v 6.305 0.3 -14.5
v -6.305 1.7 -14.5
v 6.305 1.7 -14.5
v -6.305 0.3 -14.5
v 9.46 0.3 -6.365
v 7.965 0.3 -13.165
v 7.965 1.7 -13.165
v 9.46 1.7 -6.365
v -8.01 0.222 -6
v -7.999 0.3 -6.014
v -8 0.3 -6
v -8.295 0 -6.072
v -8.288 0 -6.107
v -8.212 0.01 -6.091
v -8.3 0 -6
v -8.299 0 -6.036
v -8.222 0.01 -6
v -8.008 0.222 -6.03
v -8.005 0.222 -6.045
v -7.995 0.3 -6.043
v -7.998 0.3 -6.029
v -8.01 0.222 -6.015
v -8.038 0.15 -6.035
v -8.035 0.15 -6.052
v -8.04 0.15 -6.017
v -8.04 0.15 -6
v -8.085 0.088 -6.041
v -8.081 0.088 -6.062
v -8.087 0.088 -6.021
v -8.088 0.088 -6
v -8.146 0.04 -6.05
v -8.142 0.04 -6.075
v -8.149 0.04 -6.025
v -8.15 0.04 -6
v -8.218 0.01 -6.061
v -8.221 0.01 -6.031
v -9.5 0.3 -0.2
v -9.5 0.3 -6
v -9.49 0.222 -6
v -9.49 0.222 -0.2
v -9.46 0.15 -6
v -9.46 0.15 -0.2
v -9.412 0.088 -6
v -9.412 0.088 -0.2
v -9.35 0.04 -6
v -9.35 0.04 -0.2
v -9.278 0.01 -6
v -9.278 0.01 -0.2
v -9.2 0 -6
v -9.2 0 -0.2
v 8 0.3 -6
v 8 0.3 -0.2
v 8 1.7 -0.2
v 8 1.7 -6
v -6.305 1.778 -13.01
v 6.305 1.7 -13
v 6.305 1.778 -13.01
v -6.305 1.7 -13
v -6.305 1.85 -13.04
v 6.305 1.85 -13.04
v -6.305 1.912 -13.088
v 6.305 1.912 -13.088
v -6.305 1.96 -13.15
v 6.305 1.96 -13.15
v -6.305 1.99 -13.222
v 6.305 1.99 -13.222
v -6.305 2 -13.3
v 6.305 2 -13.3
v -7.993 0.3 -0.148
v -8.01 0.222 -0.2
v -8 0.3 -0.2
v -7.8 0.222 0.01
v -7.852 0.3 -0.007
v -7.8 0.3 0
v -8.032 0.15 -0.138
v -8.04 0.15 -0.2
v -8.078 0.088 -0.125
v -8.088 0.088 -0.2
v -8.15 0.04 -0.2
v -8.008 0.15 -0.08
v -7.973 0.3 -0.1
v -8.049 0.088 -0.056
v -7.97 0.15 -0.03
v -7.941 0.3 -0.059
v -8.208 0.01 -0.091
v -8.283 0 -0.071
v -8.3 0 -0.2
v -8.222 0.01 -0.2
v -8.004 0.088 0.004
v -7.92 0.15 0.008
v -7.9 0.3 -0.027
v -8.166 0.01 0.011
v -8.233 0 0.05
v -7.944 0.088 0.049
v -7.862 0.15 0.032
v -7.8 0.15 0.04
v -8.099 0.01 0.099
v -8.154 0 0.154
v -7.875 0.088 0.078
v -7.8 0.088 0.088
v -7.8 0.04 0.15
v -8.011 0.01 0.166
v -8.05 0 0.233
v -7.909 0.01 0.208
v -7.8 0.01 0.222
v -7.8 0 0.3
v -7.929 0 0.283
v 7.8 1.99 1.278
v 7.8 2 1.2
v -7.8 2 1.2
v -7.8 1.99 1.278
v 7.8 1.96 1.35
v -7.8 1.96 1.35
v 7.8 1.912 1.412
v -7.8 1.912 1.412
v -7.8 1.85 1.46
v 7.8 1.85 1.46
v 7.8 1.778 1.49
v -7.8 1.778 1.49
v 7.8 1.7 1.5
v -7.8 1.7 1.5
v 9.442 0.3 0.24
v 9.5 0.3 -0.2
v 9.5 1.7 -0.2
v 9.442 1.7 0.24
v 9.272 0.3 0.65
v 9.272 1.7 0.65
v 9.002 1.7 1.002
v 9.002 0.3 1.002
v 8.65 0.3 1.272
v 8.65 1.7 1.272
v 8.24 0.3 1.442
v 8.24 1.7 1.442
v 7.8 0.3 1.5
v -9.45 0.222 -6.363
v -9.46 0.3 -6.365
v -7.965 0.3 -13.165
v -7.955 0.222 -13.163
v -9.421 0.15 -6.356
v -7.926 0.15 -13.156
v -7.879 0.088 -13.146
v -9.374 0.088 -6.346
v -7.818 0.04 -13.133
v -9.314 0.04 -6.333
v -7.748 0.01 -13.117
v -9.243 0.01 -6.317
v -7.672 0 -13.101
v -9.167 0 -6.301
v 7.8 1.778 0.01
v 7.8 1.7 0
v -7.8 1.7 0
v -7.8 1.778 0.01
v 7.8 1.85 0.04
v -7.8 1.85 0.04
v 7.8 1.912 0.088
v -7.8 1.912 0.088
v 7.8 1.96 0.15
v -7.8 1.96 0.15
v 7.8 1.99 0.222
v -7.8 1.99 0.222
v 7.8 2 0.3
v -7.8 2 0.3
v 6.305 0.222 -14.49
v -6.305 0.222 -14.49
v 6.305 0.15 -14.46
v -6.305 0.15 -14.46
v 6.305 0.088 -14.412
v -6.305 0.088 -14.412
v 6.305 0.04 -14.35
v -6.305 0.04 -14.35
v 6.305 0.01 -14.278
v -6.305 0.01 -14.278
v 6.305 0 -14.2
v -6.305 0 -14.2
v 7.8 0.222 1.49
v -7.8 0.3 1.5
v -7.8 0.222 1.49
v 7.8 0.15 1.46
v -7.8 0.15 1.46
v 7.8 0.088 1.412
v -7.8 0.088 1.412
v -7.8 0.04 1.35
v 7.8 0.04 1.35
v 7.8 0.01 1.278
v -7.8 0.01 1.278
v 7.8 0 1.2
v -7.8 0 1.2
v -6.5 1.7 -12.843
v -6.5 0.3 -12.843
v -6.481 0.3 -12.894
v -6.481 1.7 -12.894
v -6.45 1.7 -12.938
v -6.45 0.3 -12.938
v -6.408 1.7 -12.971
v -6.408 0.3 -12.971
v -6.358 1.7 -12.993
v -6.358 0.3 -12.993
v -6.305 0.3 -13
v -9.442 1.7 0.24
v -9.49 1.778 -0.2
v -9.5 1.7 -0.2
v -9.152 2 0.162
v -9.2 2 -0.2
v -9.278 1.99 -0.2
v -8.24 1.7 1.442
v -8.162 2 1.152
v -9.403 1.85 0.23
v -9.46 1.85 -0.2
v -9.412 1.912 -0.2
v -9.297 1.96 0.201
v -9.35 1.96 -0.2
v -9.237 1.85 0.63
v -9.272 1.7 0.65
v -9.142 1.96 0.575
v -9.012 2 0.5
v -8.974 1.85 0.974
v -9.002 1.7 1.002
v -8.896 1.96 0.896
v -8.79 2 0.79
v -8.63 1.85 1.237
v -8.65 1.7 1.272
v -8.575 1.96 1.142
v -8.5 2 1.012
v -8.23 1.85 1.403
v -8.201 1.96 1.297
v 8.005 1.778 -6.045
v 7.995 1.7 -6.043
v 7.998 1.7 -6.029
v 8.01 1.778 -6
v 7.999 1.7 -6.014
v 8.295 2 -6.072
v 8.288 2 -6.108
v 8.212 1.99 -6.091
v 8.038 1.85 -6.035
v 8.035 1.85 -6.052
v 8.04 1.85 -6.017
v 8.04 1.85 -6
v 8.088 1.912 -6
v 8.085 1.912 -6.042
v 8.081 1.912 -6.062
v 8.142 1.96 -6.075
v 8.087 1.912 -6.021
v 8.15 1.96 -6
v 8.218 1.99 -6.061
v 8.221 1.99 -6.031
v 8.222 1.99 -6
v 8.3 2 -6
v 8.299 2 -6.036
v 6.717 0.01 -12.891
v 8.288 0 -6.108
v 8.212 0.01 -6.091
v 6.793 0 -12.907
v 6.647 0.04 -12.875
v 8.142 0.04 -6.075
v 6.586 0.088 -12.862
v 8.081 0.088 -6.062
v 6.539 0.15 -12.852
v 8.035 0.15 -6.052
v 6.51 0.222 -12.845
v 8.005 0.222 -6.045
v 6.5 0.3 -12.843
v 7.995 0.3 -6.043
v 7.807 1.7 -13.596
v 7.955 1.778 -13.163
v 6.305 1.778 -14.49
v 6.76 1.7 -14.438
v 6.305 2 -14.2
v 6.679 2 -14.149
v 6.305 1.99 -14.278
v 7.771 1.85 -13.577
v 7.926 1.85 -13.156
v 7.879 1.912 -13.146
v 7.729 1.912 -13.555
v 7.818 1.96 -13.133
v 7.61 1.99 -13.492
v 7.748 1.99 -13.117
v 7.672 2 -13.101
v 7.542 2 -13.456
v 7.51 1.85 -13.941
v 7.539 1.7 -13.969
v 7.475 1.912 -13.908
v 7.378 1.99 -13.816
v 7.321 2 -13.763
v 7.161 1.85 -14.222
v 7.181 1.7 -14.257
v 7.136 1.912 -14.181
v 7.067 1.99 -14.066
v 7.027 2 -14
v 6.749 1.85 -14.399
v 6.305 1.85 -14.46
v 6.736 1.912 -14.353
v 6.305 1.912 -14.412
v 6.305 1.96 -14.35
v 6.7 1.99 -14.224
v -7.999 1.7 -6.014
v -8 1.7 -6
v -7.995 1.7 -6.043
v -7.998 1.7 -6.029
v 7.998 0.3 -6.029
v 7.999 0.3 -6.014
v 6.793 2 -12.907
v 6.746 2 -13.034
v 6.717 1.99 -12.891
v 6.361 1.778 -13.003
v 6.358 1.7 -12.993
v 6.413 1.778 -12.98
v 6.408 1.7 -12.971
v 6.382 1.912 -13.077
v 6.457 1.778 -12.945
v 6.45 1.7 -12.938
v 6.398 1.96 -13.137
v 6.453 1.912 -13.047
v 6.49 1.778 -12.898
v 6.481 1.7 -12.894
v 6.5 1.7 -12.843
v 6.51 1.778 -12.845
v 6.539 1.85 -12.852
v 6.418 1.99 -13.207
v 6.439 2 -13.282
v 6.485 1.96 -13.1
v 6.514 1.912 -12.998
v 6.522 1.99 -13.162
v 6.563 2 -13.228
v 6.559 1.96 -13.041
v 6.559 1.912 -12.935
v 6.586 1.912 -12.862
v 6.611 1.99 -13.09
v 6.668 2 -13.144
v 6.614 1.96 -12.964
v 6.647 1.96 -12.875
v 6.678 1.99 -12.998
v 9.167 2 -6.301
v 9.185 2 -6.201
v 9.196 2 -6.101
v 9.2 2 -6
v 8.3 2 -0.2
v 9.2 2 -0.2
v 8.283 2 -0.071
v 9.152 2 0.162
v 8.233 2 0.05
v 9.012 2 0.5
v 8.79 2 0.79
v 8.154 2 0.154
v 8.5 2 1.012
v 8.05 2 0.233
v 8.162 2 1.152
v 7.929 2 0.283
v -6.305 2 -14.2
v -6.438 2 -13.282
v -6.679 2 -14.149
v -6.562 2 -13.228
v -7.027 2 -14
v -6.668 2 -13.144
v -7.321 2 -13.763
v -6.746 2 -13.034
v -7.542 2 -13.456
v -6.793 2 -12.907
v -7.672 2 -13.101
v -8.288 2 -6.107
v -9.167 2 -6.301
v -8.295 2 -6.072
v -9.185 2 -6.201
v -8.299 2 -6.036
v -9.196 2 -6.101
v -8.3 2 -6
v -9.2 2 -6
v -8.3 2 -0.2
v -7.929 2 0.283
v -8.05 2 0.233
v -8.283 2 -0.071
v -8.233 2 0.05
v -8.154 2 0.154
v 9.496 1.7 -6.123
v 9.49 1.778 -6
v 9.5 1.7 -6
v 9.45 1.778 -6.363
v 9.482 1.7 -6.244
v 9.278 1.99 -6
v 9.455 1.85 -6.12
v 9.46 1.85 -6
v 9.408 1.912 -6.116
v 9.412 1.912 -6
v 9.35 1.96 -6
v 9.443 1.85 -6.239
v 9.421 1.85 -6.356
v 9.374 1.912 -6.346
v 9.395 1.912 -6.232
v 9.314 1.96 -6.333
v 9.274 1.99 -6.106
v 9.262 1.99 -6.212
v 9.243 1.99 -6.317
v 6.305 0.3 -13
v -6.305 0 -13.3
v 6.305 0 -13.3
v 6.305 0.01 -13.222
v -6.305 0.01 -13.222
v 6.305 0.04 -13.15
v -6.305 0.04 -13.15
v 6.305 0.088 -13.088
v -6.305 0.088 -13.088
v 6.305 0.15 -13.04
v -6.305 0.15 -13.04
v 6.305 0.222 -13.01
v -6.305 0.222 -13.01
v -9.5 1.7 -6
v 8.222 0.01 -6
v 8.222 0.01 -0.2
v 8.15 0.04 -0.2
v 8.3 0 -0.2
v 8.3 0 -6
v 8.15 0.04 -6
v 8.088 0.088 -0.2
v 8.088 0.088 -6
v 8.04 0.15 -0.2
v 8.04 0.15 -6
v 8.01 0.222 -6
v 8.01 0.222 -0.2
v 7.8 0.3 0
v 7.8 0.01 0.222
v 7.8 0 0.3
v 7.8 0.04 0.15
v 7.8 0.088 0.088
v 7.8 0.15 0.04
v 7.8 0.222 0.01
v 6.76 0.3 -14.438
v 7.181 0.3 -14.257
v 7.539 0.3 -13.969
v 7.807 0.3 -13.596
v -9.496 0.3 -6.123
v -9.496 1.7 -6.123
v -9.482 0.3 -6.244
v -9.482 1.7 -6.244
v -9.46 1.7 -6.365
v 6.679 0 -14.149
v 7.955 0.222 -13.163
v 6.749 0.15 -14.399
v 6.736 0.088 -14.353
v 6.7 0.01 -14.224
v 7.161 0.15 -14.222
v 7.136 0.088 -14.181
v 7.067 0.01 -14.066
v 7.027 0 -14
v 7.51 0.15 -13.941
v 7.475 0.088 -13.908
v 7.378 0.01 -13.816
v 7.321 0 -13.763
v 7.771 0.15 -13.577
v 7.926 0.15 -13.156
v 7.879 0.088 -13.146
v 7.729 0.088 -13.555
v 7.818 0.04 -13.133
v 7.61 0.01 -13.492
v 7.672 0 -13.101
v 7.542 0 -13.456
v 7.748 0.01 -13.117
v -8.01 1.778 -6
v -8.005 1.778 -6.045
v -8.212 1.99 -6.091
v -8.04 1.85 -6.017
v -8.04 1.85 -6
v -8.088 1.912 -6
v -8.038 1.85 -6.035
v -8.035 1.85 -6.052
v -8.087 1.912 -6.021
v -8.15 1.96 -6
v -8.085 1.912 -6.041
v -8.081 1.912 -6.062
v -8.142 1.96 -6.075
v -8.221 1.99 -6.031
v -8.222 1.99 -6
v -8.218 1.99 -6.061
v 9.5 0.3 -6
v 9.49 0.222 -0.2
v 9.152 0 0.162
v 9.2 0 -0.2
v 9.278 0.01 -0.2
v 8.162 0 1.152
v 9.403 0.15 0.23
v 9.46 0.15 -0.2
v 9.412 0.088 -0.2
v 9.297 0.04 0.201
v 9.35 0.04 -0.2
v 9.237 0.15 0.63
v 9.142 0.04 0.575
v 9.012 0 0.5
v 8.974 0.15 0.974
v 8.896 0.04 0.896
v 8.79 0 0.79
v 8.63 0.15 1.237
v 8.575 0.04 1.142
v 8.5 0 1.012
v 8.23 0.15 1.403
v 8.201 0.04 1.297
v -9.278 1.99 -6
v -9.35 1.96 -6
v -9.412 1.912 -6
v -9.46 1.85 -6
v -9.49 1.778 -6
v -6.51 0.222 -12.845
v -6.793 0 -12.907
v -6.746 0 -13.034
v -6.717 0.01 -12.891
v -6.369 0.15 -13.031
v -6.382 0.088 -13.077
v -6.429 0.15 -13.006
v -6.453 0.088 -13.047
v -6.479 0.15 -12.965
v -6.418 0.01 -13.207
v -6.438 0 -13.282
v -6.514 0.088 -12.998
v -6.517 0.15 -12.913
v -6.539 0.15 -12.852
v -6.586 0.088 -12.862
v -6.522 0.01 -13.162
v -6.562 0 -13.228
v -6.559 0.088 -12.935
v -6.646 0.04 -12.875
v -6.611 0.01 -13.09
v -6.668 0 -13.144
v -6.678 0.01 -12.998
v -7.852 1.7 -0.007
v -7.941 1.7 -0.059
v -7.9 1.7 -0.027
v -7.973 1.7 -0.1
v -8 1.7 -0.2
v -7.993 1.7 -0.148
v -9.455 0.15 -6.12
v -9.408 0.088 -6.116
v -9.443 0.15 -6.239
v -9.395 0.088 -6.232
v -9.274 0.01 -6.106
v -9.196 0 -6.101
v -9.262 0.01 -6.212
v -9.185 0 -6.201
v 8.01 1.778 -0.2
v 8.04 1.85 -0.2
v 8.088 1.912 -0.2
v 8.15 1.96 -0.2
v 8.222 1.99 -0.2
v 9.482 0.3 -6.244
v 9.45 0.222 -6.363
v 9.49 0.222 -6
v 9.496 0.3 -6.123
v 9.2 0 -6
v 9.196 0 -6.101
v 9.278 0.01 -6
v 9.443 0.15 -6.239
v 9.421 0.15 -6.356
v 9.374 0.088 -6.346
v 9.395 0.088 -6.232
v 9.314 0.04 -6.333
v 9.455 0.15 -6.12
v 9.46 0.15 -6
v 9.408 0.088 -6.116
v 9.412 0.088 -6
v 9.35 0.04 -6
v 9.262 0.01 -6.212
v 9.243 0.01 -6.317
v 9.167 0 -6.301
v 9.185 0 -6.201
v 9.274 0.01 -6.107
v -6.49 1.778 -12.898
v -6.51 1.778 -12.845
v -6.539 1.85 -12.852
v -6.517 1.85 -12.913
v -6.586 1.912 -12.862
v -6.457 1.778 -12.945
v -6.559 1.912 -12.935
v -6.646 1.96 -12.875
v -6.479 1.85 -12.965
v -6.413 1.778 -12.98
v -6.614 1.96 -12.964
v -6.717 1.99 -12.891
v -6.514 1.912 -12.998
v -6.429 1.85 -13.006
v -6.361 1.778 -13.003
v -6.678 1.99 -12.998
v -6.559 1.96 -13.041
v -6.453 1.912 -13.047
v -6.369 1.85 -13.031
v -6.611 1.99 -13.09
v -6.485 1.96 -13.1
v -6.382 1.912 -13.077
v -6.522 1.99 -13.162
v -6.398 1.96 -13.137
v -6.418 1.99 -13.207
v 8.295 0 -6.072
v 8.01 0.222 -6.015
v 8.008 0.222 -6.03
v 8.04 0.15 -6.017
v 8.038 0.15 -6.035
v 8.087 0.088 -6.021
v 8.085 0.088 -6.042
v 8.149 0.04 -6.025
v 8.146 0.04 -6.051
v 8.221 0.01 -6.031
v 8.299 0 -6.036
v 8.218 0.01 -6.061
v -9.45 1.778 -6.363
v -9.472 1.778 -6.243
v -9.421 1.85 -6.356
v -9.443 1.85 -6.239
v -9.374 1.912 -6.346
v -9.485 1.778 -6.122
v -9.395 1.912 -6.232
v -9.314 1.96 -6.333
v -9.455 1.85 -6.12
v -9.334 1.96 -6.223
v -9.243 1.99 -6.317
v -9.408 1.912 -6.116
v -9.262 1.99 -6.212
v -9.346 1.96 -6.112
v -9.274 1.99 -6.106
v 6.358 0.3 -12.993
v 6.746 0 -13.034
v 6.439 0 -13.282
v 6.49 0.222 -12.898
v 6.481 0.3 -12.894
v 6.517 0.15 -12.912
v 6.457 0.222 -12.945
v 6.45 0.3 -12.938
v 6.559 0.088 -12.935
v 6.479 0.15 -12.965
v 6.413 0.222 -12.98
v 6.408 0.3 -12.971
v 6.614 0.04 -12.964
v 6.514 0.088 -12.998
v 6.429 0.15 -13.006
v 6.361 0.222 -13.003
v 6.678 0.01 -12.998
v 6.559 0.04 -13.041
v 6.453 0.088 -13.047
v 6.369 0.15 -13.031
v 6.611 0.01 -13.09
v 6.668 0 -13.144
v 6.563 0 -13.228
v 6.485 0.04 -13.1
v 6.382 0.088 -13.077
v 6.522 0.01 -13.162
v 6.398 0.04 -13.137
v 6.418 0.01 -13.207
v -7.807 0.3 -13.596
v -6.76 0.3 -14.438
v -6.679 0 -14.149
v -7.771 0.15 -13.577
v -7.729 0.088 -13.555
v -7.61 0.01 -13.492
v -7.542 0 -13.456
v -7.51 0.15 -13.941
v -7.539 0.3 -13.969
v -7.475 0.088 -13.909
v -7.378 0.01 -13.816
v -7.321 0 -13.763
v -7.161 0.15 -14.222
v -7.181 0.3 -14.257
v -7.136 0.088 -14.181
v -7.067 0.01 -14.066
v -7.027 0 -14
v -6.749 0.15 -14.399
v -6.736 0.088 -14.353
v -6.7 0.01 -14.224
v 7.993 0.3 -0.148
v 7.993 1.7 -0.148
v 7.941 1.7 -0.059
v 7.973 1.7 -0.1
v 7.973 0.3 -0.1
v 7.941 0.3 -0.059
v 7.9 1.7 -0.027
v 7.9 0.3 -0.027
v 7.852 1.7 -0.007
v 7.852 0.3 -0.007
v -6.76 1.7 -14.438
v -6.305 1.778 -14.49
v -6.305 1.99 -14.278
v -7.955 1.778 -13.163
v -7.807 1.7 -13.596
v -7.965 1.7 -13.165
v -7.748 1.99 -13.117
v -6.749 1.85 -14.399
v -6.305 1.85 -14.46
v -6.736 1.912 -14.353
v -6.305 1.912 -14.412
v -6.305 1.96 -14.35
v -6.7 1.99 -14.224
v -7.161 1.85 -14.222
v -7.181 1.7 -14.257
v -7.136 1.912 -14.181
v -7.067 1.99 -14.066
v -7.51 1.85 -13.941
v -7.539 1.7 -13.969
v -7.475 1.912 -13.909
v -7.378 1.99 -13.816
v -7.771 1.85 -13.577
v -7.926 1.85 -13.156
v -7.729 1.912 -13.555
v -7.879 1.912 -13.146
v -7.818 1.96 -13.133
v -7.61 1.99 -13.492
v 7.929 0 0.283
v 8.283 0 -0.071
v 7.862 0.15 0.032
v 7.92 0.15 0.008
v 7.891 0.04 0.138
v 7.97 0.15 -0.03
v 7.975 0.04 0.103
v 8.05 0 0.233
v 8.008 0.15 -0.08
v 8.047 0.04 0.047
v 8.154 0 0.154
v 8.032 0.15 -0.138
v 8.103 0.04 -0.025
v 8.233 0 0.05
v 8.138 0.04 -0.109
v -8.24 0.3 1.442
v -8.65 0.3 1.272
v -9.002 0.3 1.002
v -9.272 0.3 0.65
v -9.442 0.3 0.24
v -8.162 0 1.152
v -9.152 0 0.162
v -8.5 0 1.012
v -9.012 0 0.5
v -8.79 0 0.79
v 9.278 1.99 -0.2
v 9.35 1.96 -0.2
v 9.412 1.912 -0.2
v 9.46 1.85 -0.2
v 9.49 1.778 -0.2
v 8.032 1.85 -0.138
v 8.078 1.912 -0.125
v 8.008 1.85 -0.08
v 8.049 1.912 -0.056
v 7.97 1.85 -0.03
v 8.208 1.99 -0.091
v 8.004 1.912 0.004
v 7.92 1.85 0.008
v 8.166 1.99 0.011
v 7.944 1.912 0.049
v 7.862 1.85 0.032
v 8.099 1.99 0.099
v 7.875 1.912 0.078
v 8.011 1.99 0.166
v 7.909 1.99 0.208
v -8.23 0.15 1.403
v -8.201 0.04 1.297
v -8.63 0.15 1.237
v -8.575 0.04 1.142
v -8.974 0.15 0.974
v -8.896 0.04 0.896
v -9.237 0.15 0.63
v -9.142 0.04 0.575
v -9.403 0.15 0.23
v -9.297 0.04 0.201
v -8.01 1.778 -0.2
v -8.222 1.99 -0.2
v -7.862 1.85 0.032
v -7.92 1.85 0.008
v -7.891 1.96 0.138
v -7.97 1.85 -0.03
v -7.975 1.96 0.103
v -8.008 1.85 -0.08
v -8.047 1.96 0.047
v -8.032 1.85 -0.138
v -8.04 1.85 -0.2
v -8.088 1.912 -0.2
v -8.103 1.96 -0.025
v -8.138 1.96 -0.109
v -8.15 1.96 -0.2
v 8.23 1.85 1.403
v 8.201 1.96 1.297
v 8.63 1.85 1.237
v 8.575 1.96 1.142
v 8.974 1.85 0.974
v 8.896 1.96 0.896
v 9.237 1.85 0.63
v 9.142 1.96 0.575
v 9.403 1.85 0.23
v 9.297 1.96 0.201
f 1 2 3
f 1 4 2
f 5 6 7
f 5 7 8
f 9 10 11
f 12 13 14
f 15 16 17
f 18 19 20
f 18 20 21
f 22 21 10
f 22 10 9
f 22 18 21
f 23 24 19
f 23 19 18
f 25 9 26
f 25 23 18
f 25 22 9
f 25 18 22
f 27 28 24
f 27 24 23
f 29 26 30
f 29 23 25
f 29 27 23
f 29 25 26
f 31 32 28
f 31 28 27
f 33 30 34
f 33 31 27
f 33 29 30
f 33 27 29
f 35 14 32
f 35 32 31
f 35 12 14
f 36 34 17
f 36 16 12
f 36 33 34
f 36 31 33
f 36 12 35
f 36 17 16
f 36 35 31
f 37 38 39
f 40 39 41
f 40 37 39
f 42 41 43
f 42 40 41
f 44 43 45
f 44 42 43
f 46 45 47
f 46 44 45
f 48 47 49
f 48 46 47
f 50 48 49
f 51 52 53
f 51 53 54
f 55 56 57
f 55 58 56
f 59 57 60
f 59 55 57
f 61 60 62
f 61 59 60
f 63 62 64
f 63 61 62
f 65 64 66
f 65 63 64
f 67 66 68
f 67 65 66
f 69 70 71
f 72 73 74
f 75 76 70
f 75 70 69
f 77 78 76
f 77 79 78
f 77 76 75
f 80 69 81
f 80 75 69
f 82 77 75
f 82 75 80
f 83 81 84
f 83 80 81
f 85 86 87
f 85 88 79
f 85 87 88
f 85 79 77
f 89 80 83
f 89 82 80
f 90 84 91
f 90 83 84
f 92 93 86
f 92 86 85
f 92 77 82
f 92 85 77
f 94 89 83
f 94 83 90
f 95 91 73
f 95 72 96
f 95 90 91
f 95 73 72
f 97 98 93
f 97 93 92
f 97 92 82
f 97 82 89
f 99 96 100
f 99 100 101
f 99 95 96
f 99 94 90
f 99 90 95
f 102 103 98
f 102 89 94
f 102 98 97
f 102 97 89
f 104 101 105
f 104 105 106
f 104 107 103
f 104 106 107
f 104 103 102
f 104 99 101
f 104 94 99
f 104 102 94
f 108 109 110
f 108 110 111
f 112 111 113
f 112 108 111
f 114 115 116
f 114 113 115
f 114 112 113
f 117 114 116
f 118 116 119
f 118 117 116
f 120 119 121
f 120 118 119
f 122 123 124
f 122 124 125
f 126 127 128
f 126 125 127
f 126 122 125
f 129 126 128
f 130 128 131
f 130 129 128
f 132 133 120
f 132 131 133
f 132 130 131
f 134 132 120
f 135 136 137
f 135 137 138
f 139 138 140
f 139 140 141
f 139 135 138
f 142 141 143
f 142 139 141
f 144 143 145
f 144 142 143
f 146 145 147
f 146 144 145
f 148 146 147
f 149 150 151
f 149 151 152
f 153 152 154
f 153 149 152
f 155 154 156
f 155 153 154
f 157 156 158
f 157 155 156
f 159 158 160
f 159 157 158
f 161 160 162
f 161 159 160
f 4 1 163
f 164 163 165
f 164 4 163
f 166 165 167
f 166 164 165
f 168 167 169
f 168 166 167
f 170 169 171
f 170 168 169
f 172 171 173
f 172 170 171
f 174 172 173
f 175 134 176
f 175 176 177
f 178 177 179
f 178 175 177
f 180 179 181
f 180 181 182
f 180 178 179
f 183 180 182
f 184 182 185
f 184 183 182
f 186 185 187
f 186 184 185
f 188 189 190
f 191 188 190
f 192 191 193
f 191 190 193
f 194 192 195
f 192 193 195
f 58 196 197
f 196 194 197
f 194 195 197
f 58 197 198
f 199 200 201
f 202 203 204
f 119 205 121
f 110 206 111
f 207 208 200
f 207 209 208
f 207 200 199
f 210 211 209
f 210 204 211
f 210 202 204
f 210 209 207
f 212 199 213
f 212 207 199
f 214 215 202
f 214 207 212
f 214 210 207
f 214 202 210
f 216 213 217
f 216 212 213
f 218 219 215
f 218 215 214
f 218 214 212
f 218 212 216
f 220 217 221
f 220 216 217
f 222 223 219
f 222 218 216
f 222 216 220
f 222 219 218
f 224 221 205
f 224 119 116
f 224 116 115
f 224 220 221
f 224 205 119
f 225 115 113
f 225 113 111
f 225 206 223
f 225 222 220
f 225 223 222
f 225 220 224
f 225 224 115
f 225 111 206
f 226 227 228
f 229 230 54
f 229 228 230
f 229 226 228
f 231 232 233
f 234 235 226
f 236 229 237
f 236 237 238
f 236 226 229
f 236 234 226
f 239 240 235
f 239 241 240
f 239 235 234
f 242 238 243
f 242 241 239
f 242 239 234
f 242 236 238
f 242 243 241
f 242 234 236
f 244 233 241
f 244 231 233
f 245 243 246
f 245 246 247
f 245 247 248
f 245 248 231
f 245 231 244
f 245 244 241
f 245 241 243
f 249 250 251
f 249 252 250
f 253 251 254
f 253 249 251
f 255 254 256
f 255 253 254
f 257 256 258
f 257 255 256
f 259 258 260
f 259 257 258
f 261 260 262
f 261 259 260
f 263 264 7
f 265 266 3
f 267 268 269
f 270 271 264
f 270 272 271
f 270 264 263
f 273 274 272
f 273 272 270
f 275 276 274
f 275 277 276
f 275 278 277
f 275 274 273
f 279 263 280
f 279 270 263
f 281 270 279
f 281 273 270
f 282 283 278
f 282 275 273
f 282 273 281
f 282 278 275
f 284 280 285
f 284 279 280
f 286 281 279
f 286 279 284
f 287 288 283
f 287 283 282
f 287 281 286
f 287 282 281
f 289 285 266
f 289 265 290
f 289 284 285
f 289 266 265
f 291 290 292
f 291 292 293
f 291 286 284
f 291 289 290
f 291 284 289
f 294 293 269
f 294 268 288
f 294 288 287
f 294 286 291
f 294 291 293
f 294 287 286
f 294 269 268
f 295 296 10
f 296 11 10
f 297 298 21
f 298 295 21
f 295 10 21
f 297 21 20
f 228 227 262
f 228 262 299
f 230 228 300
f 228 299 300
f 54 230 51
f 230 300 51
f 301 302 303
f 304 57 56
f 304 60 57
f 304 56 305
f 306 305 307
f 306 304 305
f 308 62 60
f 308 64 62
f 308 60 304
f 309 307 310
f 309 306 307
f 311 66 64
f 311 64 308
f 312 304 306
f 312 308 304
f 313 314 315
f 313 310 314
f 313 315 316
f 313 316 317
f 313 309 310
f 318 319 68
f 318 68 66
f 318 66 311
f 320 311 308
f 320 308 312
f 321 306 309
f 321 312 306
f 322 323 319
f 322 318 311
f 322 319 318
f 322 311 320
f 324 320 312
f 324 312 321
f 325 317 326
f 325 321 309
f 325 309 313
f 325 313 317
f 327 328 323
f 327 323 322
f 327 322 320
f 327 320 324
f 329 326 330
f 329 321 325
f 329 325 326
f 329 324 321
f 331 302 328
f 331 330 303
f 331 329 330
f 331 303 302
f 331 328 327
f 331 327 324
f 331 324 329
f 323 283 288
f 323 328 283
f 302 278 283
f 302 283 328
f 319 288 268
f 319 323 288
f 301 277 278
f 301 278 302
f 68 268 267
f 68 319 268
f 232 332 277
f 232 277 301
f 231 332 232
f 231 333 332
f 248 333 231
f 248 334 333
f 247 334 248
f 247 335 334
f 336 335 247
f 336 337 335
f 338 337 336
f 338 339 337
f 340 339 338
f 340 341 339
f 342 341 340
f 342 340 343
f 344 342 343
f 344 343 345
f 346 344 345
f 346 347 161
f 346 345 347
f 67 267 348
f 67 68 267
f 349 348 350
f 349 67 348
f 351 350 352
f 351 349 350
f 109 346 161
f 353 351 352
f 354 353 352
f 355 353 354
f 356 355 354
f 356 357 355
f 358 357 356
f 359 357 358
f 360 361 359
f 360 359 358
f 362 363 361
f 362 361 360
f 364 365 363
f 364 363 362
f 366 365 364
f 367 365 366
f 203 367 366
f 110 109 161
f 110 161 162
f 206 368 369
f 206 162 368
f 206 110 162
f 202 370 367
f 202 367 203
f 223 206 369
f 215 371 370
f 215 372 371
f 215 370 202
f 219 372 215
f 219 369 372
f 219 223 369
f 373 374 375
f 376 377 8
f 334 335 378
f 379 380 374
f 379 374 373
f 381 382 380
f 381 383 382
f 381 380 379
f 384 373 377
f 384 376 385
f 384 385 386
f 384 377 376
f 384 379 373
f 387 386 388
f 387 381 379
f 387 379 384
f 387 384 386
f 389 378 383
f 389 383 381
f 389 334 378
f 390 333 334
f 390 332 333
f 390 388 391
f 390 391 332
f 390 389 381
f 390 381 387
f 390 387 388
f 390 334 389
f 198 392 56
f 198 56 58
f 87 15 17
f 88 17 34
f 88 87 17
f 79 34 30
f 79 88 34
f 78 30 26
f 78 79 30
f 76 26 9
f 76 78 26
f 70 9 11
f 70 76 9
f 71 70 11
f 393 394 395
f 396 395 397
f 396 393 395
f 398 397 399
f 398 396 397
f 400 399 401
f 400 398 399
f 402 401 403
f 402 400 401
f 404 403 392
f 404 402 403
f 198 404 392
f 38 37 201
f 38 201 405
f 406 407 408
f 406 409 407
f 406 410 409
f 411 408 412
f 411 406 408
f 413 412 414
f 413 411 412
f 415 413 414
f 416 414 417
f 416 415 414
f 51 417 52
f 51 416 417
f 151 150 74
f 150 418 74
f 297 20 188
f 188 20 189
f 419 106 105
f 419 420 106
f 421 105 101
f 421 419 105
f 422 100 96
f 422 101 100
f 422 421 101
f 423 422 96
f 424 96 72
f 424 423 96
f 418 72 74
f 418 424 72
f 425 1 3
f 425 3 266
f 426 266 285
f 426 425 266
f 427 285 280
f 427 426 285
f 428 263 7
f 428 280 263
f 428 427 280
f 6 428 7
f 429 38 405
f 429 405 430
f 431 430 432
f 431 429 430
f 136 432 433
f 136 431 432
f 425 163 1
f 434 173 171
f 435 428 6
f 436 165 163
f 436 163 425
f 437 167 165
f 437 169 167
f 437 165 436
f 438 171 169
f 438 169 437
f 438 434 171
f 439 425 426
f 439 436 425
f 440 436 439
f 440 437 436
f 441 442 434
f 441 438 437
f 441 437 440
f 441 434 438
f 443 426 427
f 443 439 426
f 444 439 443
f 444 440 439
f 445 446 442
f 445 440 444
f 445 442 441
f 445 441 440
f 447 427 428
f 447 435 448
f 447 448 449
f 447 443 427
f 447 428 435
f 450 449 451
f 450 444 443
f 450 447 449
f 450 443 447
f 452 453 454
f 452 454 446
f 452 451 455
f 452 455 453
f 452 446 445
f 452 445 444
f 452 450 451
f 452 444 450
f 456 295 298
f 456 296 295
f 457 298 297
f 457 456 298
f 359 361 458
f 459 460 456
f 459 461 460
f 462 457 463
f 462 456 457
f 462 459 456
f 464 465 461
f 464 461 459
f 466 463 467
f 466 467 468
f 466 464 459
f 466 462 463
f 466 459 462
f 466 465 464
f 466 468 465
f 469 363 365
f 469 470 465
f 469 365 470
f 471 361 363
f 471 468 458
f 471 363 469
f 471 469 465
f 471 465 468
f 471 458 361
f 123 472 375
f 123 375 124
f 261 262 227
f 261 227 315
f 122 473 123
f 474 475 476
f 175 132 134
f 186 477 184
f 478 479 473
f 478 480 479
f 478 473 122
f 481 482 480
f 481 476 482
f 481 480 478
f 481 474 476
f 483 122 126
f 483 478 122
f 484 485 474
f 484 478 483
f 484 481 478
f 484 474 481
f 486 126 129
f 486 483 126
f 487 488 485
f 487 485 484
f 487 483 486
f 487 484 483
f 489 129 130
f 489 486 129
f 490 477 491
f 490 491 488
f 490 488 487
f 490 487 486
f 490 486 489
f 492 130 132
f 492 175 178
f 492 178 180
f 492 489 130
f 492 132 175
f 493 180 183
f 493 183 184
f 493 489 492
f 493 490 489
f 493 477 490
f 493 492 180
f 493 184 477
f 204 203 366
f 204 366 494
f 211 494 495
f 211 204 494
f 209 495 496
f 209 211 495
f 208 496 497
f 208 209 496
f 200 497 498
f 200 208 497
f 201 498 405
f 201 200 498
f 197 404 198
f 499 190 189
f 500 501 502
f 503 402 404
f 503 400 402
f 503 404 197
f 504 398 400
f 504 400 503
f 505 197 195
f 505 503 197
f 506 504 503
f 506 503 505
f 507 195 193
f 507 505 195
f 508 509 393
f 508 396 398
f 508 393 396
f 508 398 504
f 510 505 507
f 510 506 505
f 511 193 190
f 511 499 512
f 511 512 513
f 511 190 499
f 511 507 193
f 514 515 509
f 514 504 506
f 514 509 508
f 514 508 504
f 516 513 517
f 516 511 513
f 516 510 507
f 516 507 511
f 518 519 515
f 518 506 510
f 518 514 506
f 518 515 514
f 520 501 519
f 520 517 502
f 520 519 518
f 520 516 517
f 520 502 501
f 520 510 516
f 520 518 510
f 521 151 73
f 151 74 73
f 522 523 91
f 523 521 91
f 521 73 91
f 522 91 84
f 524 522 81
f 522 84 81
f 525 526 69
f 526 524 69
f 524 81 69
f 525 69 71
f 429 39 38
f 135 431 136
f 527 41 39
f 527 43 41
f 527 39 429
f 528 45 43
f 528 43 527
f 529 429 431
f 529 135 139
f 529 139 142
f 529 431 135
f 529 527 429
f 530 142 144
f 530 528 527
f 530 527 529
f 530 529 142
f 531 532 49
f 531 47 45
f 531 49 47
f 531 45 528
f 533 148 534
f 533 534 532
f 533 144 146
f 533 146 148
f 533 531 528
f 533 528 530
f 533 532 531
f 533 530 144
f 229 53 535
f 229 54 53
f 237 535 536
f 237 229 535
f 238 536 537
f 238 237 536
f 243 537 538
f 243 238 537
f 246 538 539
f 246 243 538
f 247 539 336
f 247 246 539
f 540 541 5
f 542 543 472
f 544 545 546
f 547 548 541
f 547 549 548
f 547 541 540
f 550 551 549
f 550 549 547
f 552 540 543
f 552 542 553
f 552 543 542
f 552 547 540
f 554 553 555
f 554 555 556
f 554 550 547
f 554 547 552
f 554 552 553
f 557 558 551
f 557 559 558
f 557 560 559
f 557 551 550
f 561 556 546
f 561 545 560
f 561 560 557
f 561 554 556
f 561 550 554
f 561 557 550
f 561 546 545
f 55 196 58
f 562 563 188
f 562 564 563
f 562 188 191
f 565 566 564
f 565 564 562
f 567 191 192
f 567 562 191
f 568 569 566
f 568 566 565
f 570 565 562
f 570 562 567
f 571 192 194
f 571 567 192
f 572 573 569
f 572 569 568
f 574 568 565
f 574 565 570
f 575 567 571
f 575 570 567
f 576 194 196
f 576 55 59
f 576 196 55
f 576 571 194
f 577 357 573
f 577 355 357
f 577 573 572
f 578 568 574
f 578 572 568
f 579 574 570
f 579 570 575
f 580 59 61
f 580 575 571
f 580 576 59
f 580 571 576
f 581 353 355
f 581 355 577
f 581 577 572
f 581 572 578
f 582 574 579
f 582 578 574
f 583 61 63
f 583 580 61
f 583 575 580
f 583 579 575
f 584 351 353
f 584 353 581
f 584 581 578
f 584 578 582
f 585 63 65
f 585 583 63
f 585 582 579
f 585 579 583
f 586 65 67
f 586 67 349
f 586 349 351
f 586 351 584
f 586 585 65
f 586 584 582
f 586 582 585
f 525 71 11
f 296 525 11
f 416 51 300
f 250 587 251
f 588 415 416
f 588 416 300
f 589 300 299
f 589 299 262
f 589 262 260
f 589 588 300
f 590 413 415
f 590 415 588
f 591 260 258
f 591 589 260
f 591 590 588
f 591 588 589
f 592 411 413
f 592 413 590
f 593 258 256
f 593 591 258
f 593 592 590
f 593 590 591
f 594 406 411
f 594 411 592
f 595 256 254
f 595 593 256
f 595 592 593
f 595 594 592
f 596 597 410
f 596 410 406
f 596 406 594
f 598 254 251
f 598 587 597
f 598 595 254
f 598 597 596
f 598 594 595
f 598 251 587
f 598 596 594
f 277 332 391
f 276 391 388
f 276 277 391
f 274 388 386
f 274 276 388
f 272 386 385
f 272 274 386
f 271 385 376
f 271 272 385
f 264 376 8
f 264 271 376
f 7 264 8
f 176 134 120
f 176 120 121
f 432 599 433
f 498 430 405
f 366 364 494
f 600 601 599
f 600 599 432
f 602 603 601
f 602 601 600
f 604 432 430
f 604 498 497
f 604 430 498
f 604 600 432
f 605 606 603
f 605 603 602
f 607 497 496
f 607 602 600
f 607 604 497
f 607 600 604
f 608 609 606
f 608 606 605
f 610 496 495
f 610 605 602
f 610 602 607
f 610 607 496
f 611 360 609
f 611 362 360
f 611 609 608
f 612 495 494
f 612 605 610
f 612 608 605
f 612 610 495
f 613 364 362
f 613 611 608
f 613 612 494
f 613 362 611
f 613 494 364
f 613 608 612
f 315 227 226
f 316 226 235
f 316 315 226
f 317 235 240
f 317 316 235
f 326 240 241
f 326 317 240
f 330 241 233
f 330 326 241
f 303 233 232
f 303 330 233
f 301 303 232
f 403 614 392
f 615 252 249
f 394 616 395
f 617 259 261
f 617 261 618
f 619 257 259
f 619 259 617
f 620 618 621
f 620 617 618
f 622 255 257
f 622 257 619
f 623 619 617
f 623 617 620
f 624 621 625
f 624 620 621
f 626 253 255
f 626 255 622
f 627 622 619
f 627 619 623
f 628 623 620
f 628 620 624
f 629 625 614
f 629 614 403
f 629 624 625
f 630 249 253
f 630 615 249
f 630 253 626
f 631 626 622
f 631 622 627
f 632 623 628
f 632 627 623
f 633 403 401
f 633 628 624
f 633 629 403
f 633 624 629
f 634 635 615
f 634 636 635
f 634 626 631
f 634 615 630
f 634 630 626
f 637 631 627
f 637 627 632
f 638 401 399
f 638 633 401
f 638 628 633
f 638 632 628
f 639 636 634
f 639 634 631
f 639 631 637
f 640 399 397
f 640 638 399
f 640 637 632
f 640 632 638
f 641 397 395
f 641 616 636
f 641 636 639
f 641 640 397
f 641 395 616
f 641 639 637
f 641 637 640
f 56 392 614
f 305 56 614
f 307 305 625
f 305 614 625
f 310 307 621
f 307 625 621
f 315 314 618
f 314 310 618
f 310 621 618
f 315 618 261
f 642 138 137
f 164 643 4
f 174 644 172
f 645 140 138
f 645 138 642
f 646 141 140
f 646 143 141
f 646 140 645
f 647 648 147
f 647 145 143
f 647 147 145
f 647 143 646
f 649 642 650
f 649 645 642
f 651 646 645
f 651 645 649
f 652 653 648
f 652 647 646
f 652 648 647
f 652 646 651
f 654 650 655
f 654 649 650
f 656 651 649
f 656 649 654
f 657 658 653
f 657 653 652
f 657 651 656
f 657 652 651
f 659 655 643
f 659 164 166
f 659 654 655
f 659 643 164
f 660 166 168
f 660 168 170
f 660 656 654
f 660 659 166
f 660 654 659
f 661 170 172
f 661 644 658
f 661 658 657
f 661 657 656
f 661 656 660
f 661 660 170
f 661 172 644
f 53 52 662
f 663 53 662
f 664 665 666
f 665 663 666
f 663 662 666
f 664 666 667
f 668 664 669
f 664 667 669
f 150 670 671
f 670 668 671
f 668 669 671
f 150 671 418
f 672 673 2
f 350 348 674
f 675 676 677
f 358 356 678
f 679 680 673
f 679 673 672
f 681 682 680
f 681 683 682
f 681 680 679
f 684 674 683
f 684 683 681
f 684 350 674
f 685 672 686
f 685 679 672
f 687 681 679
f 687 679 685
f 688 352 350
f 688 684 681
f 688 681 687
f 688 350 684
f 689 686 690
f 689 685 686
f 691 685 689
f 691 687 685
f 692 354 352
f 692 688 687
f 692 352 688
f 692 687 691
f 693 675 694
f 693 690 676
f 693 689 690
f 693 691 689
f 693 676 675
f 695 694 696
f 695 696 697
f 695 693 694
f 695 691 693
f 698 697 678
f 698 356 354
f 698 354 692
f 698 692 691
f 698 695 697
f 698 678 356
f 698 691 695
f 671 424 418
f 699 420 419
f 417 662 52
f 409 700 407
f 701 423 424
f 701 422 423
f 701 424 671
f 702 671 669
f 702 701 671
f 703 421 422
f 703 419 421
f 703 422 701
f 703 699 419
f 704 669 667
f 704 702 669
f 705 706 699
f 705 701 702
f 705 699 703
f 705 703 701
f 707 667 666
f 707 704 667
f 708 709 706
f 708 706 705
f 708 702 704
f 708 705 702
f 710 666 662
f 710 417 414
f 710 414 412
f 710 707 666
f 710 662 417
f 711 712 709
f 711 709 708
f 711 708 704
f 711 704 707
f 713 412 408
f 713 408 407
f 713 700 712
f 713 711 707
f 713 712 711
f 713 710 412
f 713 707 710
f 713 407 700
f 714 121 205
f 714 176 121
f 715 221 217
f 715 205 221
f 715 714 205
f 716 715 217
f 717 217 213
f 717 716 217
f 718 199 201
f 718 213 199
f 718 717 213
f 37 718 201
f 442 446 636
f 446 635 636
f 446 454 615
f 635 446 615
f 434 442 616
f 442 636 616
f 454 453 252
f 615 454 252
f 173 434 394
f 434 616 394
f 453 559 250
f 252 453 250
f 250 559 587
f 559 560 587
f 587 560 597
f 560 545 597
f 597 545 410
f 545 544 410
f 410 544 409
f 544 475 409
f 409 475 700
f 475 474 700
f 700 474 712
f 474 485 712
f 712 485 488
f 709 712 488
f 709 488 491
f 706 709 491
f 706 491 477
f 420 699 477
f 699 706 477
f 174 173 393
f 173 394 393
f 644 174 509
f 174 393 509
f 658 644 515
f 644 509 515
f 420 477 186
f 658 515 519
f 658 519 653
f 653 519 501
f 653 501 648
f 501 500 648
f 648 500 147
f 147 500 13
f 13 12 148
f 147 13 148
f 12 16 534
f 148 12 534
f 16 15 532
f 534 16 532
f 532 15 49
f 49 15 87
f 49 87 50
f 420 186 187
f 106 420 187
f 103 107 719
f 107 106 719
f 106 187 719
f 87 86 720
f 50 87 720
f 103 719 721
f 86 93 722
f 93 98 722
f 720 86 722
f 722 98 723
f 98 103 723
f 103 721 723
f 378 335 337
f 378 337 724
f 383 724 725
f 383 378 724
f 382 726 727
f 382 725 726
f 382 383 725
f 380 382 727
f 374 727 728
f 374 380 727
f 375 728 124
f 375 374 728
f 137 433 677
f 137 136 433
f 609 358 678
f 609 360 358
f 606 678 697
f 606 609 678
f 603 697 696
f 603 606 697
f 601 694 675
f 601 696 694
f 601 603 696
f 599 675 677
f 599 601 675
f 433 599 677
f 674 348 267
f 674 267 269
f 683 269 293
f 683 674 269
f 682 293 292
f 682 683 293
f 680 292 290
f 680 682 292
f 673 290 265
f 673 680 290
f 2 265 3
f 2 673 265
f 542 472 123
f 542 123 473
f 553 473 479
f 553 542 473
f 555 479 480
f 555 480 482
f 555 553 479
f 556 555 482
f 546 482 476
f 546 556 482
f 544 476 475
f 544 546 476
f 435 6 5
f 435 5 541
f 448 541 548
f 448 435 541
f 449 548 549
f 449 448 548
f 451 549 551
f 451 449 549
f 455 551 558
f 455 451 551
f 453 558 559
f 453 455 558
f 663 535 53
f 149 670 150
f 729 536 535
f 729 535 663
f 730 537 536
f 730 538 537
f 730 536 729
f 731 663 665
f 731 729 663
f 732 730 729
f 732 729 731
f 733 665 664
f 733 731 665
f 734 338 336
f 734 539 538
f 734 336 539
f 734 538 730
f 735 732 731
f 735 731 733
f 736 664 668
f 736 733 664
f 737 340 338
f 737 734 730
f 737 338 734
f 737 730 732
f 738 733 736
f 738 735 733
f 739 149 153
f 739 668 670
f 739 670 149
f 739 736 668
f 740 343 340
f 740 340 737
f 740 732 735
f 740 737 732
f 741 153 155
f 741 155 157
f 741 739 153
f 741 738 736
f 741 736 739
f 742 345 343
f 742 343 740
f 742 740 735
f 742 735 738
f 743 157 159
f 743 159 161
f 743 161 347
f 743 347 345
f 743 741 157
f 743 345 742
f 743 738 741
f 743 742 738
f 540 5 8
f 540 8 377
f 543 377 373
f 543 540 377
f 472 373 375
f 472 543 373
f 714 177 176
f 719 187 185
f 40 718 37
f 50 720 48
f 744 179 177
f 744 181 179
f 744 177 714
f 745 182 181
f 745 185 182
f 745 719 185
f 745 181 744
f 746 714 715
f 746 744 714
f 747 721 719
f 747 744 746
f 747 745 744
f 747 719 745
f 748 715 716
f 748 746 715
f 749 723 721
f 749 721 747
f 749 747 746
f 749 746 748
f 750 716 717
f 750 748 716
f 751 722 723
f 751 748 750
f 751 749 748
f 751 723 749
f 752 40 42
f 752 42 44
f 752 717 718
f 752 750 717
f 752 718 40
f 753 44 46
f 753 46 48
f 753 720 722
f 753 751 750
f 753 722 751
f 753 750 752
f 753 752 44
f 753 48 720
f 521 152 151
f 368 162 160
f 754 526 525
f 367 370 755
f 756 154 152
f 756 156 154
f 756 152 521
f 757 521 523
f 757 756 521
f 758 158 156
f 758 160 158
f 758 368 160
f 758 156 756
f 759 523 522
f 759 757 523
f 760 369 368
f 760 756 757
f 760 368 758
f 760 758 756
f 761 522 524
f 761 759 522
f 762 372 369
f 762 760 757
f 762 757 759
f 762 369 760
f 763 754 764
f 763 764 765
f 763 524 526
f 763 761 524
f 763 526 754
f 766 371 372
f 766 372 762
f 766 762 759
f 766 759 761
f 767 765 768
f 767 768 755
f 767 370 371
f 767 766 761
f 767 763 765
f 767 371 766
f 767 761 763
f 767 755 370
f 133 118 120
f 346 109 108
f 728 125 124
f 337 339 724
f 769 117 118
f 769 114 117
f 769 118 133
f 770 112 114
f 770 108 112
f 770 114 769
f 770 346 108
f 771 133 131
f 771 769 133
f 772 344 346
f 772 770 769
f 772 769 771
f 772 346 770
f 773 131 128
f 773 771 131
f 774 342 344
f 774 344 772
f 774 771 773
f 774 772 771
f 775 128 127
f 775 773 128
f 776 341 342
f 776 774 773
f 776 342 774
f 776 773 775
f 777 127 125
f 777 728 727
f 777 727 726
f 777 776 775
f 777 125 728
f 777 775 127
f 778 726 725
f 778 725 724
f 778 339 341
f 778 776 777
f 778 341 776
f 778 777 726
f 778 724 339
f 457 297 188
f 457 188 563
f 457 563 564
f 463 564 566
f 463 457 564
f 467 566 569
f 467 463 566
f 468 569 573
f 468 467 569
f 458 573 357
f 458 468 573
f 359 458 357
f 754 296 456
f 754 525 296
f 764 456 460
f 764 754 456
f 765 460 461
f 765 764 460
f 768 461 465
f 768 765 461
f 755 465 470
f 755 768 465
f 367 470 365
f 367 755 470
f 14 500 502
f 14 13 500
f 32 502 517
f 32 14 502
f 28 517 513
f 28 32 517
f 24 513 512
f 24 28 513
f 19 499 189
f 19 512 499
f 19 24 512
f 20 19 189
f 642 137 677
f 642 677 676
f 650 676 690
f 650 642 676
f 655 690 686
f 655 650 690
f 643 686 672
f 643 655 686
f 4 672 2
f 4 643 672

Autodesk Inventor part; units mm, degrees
ref_plane "YZ Plane" through (0, 0, 0) normal (1, 0, 0) x (0, 1, 0)
ref_plane "XZ Plane" through (0, 0, 0) normal (0, 1, 0) x (-1, 0, 0)
ref_plane "XY Plane" through (0, 0, 0) normal (0, 0, 1) x (1, 0, 0)
sketch "Sketch1" plane through (0, 0, 0) normal (0, 1, 0) x (-1, 0, 0)
  line L0 (-7.8, 0) -> (7.8, 0)
  arc A0 (8, -0.2) -> (7.8, 0) centre (7.8, -0.2) ccw
  arc A1 (-7.8, 0) -> (-8, -0.2) centre (-7.8, -0.2) ccw
  line L1 (-8, -0.2) -> (-8, -6)
  line L2 (8, -0.2) -> (8, -6)
  arc A2 (-8, -6) -> (-7.9953, -6.043) centre (-7.8, -6) ccw
  arc A3 (7.9953, -6.043) -> (8, -6) centre (7.8, -6) ccw
  line L3 (-7.9953, -6.043) -> (-6.5, -12.843)
  line L4 (7.9953, -6.043) -> (6.5, -12.843)
  arc A4 (-6.5, -12.843) -> (-6.3047, -13) centre (-6.3047, -12.8) ccw
  line L5 (-6.3047, -13) -> (6.3047, -13)
  arc A5 (6.3047, -13) -> (6.5, -12.843) centre (6.3047, -12.8) ccw
  line L6 (-9.5, -6) -> (-9.5, -0.2)
  arc A6 (-7.8, 1.5) -> (-9.5, -0.2) centre (-7.8, -0.2) ccw
  line L7 (-7.8, 1.5) -> (7.8, 1.5)
  arc A7 (9.5, -0.2) -> (7.8, 1.5) centre (7.8, -0.2) ccw
  line L8 (9.5, -0.2) -> (9.5, -6)
  arc A8 (9.4603, -6.3651) -> (9.5, -6) centre (7.8, -6) ccw
  line L9 (9.4603, -6.3651) -> (7.965, -13.1651)
  arc A9 (6.3047, -14.5) -> (7.965, -13.1651) centre (6.3047, -12.8) ccw
  line L10 (6.3047, -14.5) -> (-6.3047, -14.5)
  arc A10 (-7.965, -13.1651) -> (-6.3047, -14.5) centre (-6.3047, -12.8) ccw
  line L11 (-7.965, -13.1651) -> (-9.4603, -6.3651)
  arc A11 (-9.5, -6) -> (-9.4603, -6.3651) centre (-7.8, -6) ccw
  point P0 (0, 0)
  point P1 (0, 0)
  point P2 (0, -13)
  dimension "d0" = 0.2
  dimension "d1" = 0.2
  dimension "d2" = 16
  dimension "d3" = 6
  dimension "d4" = 0.2
  dimension "d5" = 0.2
  dimension "d6" = 0.2
  dimension "d7" = 0.2
  dimension "d8" = 13
  dimension "d9" = 13
  dimension "d10" = 1.5
extrude "Extrusion1" add sketch "Sketch1" along normal blind 2
fillet "Fillet1" radius 0.3 48 edges at (9.0021, 2, 1.0021) (9.5, 2, -3.1) (9.4901, 2, -6.1836) (8.7127, 2, -9.7651) (7.3699, 2, -14.1249) (0, 2, -14.5) (-7.3699, 2, -14.1249) (-8.7127, 2, -9.7651) (-9.4901, 2, -6.1836) (-9.5, 2, -3.1) (-9.0021, 2, 1.0021) (0, 2, 1.5) (-7.9414, 2, -0.0586) (-8, 2, -3.1) (-7.9988, 2, -6.0216) (-7.2477, 2, -9.443) (-6.43, 2, -12.9559) (0, 2, -13) (6.43, 2, -12.9559) (7.2477, 2, -9.443) (7.9988, 2, -6.0216) (8, 2, -3.1) (7.9414, 2, -0.0586) (0, 2, 0) (-9.0021, 0, 1.0021) (-9.5, 0, -3.1) (-9.4901, 0, -6.1836) (-8.7127, 0, -9.7651) (-7.3699, 0, -14.1249) (0, 0, -14.5) (7.3699, 0, -14.1249) (8.7127, 0, -9.7651) (9.4901, 0, -6.1836) (9.5, 0, -3.1) (9.0021, 0, 1.0021) (0, 0, 1.5) (7.9414, 0, -0.0586) (8, 0, -3.1) (7.9988, 0, -6.0216) (7.2477, 0, -9.443) (6.43, 0, -12.9559) (0, 0, -13) (-6.43, 0, -12.9559) (-7.2477, 0, -9.443) (-7.9988, 0, -6.0216) (-8, 0, -3.1) (-7.9414, 0, -0.0586) (0, 0, 0)
equation "\"d1\" = d0"
equation "\"d4\" = d0"
equation "\"d5\" = d4"
equation "\"d6\" = d5"
equation "\"d7\" = d6"
properties part number "y_carryage_nut_holder_a_zip_tie"
